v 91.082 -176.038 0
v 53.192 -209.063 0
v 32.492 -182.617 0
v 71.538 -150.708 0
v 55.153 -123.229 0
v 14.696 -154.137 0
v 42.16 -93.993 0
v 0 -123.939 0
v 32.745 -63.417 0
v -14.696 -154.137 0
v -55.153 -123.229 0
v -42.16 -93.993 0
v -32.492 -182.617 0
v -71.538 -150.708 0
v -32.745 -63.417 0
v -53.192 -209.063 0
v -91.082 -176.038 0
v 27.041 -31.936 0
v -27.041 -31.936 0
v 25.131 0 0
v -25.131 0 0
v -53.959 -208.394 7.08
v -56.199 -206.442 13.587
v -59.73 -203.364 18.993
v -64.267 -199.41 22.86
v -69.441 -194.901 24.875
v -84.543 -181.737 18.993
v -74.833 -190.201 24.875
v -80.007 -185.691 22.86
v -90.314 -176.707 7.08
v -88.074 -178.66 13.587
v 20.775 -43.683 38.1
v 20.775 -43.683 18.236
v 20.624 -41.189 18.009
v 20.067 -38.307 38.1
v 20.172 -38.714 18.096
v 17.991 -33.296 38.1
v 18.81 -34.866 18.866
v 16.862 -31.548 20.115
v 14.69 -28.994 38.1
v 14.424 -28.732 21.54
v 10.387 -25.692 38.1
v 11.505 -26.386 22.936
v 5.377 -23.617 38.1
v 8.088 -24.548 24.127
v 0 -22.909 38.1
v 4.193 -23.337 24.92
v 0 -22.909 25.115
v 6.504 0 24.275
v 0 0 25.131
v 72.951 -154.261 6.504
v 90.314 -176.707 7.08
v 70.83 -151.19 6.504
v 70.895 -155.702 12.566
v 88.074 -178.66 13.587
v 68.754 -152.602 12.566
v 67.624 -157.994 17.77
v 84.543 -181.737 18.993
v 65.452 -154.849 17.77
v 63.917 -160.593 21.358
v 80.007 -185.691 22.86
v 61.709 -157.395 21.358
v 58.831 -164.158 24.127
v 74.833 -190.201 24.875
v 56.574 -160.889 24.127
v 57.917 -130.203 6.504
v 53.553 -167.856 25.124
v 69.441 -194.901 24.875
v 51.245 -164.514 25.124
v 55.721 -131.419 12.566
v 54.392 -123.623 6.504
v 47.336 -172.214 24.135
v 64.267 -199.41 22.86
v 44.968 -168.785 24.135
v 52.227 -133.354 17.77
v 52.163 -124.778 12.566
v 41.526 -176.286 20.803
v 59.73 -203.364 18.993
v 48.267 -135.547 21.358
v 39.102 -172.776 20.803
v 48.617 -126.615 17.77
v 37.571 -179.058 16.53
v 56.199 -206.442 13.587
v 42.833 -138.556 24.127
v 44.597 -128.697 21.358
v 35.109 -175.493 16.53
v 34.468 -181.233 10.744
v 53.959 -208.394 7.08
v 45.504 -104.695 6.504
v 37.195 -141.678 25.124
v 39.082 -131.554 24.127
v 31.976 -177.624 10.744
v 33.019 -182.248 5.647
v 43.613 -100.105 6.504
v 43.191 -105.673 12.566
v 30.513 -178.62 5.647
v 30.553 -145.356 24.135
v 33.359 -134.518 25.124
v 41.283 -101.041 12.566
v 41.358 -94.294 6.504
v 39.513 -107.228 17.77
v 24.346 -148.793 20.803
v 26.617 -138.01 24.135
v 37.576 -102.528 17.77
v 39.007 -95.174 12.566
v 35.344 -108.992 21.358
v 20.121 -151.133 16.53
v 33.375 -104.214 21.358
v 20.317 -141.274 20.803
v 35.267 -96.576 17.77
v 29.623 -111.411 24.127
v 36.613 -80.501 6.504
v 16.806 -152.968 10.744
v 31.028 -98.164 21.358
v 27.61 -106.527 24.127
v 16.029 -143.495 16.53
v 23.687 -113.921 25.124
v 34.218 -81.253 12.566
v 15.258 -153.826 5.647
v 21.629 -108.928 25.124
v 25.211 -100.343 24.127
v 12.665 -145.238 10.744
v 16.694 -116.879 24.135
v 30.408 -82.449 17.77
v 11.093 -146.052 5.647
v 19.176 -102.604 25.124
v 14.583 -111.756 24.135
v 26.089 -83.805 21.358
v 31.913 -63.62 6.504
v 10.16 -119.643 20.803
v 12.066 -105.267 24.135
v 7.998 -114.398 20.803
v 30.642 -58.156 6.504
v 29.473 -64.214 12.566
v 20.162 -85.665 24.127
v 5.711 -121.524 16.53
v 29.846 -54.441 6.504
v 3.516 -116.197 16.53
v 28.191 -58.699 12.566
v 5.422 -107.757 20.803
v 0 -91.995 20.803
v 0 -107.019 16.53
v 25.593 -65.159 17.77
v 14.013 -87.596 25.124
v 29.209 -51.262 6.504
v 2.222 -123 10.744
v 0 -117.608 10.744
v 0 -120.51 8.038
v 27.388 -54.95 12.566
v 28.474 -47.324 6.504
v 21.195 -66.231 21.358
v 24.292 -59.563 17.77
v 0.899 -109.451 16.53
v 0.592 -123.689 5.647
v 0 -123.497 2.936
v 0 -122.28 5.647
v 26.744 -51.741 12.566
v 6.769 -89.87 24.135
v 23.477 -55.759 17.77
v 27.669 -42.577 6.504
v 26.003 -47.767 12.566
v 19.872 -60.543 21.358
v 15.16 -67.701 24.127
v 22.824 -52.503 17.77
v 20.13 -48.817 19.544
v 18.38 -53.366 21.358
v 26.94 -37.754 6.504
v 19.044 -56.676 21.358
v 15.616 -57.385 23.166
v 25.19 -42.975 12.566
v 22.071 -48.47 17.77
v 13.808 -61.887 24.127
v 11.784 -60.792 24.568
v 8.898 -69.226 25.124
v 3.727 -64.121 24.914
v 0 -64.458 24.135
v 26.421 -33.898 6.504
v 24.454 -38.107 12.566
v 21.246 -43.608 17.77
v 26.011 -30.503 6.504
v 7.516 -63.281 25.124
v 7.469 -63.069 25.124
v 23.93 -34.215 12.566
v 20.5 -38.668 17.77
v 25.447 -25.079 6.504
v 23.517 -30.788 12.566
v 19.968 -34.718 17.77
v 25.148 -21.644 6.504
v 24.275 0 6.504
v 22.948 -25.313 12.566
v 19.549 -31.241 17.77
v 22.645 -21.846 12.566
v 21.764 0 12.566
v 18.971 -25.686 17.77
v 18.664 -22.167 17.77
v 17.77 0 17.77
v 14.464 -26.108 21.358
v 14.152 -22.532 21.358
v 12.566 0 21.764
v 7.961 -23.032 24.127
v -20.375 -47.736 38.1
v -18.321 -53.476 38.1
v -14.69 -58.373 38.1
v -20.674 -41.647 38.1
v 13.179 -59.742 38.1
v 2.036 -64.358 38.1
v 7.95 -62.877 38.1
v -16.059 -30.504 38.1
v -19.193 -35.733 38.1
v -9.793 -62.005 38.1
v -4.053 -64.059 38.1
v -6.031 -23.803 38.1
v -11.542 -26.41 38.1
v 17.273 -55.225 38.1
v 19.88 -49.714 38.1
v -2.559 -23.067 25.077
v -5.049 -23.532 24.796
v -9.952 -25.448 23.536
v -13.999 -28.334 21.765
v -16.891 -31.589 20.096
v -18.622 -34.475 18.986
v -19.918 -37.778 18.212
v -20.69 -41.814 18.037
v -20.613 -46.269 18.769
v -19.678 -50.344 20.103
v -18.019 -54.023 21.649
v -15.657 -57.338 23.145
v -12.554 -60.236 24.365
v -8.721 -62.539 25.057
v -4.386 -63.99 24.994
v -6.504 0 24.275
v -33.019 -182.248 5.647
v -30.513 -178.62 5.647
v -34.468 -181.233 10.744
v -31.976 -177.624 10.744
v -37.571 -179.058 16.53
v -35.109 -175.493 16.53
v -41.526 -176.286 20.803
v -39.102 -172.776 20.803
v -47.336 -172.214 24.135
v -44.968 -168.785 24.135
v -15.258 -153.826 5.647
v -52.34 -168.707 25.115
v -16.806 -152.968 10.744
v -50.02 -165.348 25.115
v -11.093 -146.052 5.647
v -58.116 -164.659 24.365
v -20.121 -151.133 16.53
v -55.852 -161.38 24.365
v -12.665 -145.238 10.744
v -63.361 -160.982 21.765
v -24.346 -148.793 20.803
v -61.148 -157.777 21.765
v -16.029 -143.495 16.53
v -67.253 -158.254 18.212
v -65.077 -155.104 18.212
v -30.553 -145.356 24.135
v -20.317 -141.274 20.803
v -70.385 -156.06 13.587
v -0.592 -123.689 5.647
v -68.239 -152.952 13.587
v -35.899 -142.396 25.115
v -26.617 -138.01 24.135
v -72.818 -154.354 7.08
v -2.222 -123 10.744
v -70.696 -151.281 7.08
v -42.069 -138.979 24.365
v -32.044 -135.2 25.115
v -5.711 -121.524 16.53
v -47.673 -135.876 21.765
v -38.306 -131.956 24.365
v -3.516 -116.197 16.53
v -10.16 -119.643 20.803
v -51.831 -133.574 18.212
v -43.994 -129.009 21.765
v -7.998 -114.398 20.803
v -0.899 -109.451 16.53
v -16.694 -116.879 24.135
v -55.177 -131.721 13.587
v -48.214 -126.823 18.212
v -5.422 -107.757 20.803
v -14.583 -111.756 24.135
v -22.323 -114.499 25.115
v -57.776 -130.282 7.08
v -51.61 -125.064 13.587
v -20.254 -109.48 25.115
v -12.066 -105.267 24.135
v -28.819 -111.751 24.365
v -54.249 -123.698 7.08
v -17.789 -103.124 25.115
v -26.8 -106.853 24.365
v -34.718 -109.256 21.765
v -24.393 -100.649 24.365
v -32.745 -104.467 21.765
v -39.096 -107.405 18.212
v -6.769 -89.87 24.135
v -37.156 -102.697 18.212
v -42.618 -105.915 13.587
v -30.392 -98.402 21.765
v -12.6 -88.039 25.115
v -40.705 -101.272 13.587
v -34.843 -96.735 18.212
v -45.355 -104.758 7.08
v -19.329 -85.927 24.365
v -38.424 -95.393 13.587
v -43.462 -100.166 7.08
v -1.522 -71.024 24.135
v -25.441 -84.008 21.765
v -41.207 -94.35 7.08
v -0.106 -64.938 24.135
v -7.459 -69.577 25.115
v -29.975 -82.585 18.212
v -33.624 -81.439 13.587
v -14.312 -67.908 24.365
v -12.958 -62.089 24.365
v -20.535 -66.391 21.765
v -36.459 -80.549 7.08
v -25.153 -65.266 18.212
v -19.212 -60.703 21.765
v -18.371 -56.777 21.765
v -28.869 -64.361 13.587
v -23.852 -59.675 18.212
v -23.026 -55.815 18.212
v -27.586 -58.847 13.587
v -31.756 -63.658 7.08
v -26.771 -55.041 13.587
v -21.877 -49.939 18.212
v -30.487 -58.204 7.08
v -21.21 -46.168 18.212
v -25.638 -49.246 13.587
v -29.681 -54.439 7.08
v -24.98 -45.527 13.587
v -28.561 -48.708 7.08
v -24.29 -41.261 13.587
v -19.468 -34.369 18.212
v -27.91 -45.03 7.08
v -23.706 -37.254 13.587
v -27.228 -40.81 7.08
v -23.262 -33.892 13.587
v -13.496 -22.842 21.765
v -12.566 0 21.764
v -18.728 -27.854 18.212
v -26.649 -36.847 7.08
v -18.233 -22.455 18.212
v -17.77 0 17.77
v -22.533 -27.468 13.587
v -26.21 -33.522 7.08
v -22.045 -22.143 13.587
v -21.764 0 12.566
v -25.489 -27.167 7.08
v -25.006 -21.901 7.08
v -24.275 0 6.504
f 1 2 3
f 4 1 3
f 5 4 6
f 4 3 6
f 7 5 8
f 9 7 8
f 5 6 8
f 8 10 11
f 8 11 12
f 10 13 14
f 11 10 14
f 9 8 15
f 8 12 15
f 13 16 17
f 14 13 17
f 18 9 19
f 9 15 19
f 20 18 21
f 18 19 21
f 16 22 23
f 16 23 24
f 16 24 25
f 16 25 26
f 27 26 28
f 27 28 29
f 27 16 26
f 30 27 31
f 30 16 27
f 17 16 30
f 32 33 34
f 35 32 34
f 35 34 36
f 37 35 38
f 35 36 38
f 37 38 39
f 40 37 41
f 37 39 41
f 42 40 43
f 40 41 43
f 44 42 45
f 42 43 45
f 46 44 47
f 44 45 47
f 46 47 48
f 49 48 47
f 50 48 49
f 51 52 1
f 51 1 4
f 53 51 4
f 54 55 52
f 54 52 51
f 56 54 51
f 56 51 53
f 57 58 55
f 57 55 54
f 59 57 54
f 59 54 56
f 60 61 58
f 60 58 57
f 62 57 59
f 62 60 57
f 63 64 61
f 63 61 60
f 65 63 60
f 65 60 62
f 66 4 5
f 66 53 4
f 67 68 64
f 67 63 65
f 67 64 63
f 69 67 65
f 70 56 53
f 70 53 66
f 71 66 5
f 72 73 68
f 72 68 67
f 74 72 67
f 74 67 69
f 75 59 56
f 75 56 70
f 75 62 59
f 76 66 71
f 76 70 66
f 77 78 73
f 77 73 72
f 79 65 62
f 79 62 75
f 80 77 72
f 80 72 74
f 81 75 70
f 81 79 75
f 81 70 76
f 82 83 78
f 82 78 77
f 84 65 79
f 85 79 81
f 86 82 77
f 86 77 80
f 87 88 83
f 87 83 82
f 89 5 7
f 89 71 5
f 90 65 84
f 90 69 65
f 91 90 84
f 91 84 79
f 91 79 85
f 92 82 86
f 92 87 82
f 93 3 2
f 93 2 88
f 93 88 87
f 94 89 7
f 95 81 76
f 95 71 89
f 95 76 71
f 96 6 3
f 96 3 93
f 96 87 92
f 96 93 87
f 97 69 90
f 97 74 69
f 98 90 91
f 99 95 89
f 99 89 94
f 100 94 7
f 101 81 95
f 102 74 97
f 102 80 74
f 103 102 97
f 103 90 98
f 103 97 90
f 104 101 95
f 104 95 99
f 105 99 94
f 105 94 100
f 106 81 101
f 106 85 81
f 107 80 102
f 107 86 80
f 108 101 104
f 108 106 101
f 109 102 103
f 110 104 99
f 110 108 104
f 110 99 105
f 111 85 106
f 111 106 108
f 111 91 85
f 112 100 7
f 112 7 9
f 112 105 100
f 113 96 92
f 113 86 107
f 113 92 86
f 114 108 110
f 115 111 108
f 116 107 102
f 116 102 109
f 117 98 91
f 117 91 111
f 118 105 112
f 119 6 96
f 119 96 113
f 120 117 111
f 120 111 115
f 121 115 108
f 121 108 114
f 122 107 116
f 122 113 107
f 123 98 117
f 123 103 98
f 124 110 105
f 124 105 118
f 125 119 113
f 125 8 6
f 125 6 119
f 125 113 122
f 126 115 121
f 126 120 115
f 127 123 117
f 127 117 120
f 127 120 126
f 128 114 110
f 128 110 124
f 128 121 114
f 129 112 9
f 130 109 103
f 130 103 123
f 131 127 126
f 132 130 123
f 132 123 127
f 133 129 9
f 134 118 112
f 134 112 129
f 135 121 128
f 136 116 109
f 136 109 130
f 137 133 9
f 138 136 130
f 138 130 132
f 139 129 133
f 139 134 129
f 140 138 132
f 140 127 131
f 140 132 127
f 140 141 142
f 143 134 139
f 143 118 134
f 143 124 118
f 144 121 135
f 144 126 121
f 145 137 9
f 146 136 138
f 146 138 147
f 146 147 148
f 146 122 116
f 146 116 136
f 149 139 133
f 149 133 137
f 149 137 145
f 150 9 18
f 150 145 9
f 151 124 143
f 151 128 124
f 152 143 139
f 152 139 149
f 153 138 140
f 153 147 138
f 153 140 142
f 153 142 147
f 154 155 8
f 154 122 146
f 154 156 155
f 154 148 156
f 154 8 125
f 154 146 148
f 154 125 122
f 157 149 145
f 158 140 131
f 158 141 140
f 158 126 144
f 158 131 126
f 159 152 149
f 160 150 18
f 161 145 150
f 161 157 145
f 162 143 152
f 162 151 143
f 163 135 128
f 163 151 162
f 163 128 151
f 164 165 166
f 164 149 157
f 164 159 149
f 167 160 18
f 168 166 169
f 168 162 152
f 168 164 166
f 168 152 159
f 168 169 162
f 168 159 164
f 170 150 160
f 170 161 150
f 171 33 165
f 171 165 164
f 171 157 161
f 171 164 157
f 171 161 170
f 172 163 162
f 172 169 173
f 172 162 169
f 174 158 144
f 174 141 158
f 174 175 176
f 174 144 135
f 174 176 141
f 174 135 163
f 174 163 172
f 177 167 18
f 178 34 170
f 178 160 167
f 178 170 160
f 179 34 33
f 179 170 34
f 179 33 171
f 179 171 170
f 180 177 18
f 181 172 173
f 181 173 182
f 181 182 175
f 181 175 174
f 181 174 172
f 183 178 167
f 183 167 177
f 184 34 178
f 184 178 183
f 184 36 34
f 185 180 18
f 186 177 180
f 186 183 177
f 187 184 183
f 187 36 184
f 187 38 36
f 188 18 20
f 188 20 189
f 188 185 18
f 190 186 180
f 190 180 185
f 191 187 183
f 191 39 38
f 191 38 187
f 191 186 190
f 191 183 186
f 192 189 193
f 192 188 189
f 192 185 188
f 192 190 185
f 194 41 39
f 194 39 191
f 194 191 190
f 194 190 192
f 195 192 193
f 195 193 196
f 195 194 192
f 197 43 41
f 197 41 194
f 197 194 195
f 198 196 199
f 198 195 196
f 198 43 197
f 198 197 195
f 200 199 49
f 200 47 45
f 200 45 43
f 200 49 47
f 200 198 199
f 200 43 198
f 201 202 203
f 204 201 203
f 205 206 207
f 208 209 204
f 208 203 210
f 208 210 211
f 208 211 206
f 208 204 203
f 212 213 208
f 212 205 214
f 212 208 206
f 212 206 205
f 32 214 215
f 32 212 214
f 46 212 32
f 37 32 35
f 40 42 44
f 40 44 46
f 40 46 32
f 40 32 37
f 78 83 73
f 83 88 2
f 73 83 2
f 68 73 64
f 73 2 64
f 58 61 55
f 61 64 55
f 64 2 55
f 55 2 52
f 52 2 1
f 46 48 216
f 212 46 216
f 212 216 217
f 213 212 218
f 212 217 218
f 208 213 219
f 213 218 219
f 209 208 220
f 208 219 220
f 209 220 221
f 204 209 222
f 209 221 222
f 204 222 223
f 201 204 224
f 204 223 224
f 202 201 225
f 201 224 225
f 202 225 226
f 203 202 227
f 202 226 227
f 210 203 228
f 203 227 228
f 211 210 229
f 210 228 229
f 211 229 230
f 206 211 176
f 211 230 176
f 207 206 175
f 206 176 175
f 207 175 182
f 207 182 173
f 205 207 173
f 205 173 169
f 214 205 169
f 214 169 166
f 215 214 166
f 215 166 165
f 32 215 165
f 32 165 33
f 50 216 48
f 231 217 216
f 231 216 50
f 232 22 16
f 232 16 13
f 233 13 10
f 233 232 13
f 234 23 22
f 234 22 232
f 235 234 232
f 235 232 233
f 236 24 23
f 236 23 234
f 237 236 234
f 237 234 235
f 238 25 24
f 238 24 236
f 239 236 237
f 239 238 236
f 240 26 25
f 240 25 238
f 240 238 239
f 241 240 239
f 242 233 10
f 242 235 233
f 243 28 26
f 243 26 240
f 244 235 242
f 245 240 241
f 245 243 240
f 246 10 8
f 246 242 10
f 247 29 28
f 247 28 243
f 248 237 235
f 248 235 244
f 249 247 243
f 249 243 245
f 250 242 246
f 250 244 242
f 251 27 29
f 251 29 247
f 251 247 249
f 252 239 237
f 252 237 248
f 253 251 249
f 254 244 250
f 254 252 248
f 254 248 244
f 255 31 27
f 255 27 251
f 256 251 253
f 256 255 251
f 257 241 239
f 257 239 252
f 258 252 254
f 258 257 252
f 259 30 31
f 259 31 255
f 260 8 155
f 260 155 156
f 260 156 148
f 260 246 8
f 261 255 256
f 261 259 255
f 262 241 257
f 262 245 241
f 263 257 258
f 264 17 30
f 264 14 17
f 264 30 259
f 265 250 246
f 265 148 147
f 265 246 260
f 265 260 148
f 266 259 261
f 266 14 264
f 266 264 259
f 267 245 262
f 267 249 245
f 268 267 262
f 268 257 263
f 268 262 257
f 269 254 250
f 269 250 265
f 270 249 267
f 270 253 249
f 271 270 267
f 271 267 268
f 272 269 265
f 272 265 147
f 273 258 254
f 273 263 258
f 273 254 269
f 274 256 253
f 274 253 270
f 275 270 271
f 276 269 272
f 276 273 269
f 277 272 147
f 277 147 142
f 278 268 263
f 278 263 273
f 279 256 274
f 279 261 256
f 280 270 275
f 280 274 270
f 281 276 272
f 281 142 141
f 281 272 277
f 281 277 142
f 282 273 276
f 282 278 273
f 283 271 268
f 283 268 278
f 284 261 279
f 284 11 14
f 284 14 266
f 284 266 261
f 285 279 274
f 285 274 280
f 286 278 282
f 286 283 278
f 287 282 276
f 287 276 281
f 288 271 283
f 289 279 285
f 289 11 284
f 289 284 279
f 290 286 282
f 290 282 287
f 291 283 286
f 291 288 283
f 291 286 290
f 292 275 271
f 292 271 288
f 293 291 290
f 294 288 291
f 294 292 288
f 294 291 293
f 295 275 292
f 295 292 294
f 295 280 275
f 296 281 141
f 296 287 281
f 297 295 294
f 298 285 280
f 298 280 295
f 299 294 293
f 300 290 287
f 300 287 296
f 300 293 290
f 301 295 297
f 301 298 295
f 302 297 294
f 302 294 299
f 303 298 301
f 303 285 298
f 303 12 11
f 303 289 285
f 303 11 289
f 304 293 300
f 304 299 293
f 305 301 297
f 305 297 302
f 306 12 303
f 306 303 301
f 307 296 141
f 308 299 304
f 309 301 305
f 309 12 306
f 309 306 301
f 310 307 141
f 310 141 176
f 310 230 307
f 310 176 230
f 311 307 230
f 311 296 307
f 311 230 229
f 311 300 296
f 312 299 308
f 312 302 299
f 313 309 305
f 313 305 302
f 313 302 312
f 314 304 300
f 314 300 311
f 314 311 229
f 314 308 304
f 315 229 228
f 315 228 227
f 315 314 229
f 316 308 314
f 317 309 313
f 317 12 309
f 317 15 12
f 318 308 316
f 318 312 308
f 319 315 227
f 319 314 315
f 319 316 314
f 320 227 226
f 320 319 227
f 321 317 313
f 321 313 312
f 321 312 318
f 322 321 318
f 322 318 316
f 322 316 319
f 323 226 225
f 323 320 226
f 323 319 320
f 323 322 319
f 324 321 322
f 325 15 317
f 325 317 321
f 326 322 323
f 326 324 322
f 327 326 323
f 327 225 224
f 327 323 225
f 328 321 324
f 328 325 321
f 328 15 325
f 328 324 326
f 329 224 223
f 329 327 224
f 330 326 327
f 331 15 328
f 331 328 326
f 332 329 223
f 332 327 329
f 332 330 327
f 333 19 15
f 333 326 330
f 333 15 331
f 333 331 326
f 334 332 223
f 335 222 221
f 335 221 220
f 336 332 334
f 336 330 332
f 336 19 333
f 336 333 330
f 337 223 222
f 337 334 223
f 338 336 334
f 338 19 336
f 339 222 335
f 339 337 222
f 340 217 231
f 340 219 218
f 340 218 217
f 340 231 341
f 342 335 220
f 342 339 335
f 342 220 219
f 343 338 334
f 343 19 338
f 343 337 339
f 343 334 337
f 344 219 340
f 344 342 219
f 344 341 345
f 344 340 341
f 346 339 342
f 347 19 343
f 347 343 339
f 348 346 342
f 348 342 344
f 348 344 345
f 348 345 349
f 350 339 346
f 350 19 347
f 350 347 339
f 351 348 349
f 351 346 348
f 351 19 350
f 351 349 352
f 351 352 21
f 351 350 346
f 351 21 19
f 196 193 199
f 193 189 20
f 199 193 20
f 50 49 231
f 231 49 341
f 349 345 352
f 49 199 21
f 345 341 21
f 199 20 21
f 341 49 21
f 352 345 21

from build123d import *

# Parameters (mm, degrees)
F1_DEPTH = 38.1


with BuildPart() as f1:
    # F0 (on Top) → F1 (new body)
    with BuildSketch(Plane.XY):
        with BuildLine():
            ThreePointArc((0, -22.908895), (-14.689808, -58.373229), (20.774525, -43.683421))
            ThreePointArc((20.774525, -43.683421), (14.689808, -28.993613), (0, -22.908895))
        make_face()
    extrude(amount=F1_DEPTH)

    # F4: sweep along a path in F2
    with BuildLine(Plane.XY) as f4_path:
        ThreePointArc((-72.136711, -192.550732), (-18.626108, -102.809884), (0, 0))
    # F3 (on Front) → F4 (sweep)
    with BuildSketch(Plane.XZ):
        with BuildLine():
            Line((-25.131127, 0), (25.131127, 0))
            ThreePointArc((25.131127, 0), (0, 25.131127), (-25.131127, 0))
        make_face()
    sweep(path=f4_path.line)

    # F5: sweep along a path in F2
    with BuildLine(Plane.XY) as f5_path:
        ThreePointArc((72.136711, -192.550732), (18.626108, -102.809884), (0, 0))
    # F4_face (on face) → F5 (sweep)
    with BuildSketch(Plane(origin=(0, 0, 10.665982), x_dir=(-1, 0, 0), z_dir=(0, 1, 0))):
        with BuildLine():
            Line((-25.131127, -10.665982), (25.131127, -10.665982))
            ThreePointArc((25.131127, -10.665982), (0, 14.465145), (-25.131127, -10.665982))
        make_face()
    sweep(path=f5_path.line)


solid = f1.part
